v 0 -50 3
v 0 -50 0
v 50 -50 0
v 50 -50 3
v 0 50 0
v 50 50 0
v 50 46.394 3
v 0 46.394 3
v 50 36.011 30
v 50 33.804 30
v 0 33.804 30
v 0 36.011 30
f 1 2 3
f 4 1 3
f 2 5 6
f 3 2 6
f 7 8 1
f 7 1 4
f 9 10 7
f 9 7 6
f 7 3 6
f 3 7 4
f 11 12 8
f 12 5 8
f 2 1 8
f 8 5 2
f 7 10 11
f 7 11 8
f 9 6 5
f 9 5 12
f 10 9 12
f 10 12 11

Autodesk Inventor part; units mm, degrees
ref_plane "YZ Plane" through (0, 0, 0) normal (1, 0, 0) x (0, 1, 0)
ref_plane "XZ Plane" through (0, 0, 0) normal (0, 1, 0) x (-1, 0, 0)
ref_plane "XY Plane" through (0, 0, 0) normal (0, 0, 1) x (1, 0, 0)
sketch "Náčrt1" plane through (0, 0, 0) normal (0, 0, 1) x (1, 0, 0)
  line L0 (0, -50) -> (50, -50)
  line L1 (50, -50) -> (50, 50)
  line L2 (50, 50) -> (0, 50)
  line L3 (0, 50) -> (0, -50)
  point P0 (0, 0)
  point P1 (50, 0)
  point P2 (0, 0)
  dimension "d0" = 50
  dimension "d1" = 100
extrude "Vysunutí1" add sketch "Náčrt1" along normal blind 3
sketch "Náčrt2" plane through (50, -50, 0) normal (1, 0, 0) x (0, 0, -1)
  line L0 (0, 0) -> (0, 100) projected
  line L1 (0, 100) -> (-30, 86.0108)
  line L2 (-30, 86.0108) -> (-30, 83.804)
  line L3 (-30, 83.804) -> (0, 97.7932)
  line L4 (-3, 0) -> (-3, 100) projected
  line L5 (0, 100) -> (-3, 100) projected
  point P0 (0, 50)
  point P1 (-3, 98.6011)
  dimension "d4" = 65
  dimension "d6" = 2
  dimension "d7" = 30
extrude "Vysunutí2" add sketch "Náčrt2" against normal up to surface (50 mm away) contours L3 L4 L1 L0 | L3 L2 L1 L4
extrude "Vysunutí3" cut sketch "Náčrt2" against normal through all contours L1 L4 L5
ref_plane "Pracovní rovina1" through (50, 50, 0) normal (0, -1, 0) x (1, 0, 0)
sketch "Náčrt3" plane through (50, 50, 0) normal (0, -1, 0) x (1, 0, 0)
  line L0 (-14.865, 22.13) -> (-19.865, 22.13)
  line L1 (-19.865, 22.13) -> (-19.865, 13.2518)
  line L2 (-19.865, 13.2518) -> (-14.865, 13.2518)
  line L3 (-14.865, 13.2518) -> (-14.865, 22.13)
  line L4 (-50, 13.2518) -> (-45, 13.2518)
  line L5 (-45, 13.2518) -> (-45, 22.13)
  line L6 (-45, 22.13) -> (-50, 22.13)
  line L7 (-50, 22.13) -> (-50, 13.2518)
  line L8 (0, 0) -> (0, 30) projected
  line L9 (-50, 30) -> (-50, 0) projected
  line L10 (0, 0) -> (-50, 0) projected
  dimension "d12" = 5
  dimension "d13" = 22.13
  dimension "d14" = 25.135
properties part number "Test rampy"
